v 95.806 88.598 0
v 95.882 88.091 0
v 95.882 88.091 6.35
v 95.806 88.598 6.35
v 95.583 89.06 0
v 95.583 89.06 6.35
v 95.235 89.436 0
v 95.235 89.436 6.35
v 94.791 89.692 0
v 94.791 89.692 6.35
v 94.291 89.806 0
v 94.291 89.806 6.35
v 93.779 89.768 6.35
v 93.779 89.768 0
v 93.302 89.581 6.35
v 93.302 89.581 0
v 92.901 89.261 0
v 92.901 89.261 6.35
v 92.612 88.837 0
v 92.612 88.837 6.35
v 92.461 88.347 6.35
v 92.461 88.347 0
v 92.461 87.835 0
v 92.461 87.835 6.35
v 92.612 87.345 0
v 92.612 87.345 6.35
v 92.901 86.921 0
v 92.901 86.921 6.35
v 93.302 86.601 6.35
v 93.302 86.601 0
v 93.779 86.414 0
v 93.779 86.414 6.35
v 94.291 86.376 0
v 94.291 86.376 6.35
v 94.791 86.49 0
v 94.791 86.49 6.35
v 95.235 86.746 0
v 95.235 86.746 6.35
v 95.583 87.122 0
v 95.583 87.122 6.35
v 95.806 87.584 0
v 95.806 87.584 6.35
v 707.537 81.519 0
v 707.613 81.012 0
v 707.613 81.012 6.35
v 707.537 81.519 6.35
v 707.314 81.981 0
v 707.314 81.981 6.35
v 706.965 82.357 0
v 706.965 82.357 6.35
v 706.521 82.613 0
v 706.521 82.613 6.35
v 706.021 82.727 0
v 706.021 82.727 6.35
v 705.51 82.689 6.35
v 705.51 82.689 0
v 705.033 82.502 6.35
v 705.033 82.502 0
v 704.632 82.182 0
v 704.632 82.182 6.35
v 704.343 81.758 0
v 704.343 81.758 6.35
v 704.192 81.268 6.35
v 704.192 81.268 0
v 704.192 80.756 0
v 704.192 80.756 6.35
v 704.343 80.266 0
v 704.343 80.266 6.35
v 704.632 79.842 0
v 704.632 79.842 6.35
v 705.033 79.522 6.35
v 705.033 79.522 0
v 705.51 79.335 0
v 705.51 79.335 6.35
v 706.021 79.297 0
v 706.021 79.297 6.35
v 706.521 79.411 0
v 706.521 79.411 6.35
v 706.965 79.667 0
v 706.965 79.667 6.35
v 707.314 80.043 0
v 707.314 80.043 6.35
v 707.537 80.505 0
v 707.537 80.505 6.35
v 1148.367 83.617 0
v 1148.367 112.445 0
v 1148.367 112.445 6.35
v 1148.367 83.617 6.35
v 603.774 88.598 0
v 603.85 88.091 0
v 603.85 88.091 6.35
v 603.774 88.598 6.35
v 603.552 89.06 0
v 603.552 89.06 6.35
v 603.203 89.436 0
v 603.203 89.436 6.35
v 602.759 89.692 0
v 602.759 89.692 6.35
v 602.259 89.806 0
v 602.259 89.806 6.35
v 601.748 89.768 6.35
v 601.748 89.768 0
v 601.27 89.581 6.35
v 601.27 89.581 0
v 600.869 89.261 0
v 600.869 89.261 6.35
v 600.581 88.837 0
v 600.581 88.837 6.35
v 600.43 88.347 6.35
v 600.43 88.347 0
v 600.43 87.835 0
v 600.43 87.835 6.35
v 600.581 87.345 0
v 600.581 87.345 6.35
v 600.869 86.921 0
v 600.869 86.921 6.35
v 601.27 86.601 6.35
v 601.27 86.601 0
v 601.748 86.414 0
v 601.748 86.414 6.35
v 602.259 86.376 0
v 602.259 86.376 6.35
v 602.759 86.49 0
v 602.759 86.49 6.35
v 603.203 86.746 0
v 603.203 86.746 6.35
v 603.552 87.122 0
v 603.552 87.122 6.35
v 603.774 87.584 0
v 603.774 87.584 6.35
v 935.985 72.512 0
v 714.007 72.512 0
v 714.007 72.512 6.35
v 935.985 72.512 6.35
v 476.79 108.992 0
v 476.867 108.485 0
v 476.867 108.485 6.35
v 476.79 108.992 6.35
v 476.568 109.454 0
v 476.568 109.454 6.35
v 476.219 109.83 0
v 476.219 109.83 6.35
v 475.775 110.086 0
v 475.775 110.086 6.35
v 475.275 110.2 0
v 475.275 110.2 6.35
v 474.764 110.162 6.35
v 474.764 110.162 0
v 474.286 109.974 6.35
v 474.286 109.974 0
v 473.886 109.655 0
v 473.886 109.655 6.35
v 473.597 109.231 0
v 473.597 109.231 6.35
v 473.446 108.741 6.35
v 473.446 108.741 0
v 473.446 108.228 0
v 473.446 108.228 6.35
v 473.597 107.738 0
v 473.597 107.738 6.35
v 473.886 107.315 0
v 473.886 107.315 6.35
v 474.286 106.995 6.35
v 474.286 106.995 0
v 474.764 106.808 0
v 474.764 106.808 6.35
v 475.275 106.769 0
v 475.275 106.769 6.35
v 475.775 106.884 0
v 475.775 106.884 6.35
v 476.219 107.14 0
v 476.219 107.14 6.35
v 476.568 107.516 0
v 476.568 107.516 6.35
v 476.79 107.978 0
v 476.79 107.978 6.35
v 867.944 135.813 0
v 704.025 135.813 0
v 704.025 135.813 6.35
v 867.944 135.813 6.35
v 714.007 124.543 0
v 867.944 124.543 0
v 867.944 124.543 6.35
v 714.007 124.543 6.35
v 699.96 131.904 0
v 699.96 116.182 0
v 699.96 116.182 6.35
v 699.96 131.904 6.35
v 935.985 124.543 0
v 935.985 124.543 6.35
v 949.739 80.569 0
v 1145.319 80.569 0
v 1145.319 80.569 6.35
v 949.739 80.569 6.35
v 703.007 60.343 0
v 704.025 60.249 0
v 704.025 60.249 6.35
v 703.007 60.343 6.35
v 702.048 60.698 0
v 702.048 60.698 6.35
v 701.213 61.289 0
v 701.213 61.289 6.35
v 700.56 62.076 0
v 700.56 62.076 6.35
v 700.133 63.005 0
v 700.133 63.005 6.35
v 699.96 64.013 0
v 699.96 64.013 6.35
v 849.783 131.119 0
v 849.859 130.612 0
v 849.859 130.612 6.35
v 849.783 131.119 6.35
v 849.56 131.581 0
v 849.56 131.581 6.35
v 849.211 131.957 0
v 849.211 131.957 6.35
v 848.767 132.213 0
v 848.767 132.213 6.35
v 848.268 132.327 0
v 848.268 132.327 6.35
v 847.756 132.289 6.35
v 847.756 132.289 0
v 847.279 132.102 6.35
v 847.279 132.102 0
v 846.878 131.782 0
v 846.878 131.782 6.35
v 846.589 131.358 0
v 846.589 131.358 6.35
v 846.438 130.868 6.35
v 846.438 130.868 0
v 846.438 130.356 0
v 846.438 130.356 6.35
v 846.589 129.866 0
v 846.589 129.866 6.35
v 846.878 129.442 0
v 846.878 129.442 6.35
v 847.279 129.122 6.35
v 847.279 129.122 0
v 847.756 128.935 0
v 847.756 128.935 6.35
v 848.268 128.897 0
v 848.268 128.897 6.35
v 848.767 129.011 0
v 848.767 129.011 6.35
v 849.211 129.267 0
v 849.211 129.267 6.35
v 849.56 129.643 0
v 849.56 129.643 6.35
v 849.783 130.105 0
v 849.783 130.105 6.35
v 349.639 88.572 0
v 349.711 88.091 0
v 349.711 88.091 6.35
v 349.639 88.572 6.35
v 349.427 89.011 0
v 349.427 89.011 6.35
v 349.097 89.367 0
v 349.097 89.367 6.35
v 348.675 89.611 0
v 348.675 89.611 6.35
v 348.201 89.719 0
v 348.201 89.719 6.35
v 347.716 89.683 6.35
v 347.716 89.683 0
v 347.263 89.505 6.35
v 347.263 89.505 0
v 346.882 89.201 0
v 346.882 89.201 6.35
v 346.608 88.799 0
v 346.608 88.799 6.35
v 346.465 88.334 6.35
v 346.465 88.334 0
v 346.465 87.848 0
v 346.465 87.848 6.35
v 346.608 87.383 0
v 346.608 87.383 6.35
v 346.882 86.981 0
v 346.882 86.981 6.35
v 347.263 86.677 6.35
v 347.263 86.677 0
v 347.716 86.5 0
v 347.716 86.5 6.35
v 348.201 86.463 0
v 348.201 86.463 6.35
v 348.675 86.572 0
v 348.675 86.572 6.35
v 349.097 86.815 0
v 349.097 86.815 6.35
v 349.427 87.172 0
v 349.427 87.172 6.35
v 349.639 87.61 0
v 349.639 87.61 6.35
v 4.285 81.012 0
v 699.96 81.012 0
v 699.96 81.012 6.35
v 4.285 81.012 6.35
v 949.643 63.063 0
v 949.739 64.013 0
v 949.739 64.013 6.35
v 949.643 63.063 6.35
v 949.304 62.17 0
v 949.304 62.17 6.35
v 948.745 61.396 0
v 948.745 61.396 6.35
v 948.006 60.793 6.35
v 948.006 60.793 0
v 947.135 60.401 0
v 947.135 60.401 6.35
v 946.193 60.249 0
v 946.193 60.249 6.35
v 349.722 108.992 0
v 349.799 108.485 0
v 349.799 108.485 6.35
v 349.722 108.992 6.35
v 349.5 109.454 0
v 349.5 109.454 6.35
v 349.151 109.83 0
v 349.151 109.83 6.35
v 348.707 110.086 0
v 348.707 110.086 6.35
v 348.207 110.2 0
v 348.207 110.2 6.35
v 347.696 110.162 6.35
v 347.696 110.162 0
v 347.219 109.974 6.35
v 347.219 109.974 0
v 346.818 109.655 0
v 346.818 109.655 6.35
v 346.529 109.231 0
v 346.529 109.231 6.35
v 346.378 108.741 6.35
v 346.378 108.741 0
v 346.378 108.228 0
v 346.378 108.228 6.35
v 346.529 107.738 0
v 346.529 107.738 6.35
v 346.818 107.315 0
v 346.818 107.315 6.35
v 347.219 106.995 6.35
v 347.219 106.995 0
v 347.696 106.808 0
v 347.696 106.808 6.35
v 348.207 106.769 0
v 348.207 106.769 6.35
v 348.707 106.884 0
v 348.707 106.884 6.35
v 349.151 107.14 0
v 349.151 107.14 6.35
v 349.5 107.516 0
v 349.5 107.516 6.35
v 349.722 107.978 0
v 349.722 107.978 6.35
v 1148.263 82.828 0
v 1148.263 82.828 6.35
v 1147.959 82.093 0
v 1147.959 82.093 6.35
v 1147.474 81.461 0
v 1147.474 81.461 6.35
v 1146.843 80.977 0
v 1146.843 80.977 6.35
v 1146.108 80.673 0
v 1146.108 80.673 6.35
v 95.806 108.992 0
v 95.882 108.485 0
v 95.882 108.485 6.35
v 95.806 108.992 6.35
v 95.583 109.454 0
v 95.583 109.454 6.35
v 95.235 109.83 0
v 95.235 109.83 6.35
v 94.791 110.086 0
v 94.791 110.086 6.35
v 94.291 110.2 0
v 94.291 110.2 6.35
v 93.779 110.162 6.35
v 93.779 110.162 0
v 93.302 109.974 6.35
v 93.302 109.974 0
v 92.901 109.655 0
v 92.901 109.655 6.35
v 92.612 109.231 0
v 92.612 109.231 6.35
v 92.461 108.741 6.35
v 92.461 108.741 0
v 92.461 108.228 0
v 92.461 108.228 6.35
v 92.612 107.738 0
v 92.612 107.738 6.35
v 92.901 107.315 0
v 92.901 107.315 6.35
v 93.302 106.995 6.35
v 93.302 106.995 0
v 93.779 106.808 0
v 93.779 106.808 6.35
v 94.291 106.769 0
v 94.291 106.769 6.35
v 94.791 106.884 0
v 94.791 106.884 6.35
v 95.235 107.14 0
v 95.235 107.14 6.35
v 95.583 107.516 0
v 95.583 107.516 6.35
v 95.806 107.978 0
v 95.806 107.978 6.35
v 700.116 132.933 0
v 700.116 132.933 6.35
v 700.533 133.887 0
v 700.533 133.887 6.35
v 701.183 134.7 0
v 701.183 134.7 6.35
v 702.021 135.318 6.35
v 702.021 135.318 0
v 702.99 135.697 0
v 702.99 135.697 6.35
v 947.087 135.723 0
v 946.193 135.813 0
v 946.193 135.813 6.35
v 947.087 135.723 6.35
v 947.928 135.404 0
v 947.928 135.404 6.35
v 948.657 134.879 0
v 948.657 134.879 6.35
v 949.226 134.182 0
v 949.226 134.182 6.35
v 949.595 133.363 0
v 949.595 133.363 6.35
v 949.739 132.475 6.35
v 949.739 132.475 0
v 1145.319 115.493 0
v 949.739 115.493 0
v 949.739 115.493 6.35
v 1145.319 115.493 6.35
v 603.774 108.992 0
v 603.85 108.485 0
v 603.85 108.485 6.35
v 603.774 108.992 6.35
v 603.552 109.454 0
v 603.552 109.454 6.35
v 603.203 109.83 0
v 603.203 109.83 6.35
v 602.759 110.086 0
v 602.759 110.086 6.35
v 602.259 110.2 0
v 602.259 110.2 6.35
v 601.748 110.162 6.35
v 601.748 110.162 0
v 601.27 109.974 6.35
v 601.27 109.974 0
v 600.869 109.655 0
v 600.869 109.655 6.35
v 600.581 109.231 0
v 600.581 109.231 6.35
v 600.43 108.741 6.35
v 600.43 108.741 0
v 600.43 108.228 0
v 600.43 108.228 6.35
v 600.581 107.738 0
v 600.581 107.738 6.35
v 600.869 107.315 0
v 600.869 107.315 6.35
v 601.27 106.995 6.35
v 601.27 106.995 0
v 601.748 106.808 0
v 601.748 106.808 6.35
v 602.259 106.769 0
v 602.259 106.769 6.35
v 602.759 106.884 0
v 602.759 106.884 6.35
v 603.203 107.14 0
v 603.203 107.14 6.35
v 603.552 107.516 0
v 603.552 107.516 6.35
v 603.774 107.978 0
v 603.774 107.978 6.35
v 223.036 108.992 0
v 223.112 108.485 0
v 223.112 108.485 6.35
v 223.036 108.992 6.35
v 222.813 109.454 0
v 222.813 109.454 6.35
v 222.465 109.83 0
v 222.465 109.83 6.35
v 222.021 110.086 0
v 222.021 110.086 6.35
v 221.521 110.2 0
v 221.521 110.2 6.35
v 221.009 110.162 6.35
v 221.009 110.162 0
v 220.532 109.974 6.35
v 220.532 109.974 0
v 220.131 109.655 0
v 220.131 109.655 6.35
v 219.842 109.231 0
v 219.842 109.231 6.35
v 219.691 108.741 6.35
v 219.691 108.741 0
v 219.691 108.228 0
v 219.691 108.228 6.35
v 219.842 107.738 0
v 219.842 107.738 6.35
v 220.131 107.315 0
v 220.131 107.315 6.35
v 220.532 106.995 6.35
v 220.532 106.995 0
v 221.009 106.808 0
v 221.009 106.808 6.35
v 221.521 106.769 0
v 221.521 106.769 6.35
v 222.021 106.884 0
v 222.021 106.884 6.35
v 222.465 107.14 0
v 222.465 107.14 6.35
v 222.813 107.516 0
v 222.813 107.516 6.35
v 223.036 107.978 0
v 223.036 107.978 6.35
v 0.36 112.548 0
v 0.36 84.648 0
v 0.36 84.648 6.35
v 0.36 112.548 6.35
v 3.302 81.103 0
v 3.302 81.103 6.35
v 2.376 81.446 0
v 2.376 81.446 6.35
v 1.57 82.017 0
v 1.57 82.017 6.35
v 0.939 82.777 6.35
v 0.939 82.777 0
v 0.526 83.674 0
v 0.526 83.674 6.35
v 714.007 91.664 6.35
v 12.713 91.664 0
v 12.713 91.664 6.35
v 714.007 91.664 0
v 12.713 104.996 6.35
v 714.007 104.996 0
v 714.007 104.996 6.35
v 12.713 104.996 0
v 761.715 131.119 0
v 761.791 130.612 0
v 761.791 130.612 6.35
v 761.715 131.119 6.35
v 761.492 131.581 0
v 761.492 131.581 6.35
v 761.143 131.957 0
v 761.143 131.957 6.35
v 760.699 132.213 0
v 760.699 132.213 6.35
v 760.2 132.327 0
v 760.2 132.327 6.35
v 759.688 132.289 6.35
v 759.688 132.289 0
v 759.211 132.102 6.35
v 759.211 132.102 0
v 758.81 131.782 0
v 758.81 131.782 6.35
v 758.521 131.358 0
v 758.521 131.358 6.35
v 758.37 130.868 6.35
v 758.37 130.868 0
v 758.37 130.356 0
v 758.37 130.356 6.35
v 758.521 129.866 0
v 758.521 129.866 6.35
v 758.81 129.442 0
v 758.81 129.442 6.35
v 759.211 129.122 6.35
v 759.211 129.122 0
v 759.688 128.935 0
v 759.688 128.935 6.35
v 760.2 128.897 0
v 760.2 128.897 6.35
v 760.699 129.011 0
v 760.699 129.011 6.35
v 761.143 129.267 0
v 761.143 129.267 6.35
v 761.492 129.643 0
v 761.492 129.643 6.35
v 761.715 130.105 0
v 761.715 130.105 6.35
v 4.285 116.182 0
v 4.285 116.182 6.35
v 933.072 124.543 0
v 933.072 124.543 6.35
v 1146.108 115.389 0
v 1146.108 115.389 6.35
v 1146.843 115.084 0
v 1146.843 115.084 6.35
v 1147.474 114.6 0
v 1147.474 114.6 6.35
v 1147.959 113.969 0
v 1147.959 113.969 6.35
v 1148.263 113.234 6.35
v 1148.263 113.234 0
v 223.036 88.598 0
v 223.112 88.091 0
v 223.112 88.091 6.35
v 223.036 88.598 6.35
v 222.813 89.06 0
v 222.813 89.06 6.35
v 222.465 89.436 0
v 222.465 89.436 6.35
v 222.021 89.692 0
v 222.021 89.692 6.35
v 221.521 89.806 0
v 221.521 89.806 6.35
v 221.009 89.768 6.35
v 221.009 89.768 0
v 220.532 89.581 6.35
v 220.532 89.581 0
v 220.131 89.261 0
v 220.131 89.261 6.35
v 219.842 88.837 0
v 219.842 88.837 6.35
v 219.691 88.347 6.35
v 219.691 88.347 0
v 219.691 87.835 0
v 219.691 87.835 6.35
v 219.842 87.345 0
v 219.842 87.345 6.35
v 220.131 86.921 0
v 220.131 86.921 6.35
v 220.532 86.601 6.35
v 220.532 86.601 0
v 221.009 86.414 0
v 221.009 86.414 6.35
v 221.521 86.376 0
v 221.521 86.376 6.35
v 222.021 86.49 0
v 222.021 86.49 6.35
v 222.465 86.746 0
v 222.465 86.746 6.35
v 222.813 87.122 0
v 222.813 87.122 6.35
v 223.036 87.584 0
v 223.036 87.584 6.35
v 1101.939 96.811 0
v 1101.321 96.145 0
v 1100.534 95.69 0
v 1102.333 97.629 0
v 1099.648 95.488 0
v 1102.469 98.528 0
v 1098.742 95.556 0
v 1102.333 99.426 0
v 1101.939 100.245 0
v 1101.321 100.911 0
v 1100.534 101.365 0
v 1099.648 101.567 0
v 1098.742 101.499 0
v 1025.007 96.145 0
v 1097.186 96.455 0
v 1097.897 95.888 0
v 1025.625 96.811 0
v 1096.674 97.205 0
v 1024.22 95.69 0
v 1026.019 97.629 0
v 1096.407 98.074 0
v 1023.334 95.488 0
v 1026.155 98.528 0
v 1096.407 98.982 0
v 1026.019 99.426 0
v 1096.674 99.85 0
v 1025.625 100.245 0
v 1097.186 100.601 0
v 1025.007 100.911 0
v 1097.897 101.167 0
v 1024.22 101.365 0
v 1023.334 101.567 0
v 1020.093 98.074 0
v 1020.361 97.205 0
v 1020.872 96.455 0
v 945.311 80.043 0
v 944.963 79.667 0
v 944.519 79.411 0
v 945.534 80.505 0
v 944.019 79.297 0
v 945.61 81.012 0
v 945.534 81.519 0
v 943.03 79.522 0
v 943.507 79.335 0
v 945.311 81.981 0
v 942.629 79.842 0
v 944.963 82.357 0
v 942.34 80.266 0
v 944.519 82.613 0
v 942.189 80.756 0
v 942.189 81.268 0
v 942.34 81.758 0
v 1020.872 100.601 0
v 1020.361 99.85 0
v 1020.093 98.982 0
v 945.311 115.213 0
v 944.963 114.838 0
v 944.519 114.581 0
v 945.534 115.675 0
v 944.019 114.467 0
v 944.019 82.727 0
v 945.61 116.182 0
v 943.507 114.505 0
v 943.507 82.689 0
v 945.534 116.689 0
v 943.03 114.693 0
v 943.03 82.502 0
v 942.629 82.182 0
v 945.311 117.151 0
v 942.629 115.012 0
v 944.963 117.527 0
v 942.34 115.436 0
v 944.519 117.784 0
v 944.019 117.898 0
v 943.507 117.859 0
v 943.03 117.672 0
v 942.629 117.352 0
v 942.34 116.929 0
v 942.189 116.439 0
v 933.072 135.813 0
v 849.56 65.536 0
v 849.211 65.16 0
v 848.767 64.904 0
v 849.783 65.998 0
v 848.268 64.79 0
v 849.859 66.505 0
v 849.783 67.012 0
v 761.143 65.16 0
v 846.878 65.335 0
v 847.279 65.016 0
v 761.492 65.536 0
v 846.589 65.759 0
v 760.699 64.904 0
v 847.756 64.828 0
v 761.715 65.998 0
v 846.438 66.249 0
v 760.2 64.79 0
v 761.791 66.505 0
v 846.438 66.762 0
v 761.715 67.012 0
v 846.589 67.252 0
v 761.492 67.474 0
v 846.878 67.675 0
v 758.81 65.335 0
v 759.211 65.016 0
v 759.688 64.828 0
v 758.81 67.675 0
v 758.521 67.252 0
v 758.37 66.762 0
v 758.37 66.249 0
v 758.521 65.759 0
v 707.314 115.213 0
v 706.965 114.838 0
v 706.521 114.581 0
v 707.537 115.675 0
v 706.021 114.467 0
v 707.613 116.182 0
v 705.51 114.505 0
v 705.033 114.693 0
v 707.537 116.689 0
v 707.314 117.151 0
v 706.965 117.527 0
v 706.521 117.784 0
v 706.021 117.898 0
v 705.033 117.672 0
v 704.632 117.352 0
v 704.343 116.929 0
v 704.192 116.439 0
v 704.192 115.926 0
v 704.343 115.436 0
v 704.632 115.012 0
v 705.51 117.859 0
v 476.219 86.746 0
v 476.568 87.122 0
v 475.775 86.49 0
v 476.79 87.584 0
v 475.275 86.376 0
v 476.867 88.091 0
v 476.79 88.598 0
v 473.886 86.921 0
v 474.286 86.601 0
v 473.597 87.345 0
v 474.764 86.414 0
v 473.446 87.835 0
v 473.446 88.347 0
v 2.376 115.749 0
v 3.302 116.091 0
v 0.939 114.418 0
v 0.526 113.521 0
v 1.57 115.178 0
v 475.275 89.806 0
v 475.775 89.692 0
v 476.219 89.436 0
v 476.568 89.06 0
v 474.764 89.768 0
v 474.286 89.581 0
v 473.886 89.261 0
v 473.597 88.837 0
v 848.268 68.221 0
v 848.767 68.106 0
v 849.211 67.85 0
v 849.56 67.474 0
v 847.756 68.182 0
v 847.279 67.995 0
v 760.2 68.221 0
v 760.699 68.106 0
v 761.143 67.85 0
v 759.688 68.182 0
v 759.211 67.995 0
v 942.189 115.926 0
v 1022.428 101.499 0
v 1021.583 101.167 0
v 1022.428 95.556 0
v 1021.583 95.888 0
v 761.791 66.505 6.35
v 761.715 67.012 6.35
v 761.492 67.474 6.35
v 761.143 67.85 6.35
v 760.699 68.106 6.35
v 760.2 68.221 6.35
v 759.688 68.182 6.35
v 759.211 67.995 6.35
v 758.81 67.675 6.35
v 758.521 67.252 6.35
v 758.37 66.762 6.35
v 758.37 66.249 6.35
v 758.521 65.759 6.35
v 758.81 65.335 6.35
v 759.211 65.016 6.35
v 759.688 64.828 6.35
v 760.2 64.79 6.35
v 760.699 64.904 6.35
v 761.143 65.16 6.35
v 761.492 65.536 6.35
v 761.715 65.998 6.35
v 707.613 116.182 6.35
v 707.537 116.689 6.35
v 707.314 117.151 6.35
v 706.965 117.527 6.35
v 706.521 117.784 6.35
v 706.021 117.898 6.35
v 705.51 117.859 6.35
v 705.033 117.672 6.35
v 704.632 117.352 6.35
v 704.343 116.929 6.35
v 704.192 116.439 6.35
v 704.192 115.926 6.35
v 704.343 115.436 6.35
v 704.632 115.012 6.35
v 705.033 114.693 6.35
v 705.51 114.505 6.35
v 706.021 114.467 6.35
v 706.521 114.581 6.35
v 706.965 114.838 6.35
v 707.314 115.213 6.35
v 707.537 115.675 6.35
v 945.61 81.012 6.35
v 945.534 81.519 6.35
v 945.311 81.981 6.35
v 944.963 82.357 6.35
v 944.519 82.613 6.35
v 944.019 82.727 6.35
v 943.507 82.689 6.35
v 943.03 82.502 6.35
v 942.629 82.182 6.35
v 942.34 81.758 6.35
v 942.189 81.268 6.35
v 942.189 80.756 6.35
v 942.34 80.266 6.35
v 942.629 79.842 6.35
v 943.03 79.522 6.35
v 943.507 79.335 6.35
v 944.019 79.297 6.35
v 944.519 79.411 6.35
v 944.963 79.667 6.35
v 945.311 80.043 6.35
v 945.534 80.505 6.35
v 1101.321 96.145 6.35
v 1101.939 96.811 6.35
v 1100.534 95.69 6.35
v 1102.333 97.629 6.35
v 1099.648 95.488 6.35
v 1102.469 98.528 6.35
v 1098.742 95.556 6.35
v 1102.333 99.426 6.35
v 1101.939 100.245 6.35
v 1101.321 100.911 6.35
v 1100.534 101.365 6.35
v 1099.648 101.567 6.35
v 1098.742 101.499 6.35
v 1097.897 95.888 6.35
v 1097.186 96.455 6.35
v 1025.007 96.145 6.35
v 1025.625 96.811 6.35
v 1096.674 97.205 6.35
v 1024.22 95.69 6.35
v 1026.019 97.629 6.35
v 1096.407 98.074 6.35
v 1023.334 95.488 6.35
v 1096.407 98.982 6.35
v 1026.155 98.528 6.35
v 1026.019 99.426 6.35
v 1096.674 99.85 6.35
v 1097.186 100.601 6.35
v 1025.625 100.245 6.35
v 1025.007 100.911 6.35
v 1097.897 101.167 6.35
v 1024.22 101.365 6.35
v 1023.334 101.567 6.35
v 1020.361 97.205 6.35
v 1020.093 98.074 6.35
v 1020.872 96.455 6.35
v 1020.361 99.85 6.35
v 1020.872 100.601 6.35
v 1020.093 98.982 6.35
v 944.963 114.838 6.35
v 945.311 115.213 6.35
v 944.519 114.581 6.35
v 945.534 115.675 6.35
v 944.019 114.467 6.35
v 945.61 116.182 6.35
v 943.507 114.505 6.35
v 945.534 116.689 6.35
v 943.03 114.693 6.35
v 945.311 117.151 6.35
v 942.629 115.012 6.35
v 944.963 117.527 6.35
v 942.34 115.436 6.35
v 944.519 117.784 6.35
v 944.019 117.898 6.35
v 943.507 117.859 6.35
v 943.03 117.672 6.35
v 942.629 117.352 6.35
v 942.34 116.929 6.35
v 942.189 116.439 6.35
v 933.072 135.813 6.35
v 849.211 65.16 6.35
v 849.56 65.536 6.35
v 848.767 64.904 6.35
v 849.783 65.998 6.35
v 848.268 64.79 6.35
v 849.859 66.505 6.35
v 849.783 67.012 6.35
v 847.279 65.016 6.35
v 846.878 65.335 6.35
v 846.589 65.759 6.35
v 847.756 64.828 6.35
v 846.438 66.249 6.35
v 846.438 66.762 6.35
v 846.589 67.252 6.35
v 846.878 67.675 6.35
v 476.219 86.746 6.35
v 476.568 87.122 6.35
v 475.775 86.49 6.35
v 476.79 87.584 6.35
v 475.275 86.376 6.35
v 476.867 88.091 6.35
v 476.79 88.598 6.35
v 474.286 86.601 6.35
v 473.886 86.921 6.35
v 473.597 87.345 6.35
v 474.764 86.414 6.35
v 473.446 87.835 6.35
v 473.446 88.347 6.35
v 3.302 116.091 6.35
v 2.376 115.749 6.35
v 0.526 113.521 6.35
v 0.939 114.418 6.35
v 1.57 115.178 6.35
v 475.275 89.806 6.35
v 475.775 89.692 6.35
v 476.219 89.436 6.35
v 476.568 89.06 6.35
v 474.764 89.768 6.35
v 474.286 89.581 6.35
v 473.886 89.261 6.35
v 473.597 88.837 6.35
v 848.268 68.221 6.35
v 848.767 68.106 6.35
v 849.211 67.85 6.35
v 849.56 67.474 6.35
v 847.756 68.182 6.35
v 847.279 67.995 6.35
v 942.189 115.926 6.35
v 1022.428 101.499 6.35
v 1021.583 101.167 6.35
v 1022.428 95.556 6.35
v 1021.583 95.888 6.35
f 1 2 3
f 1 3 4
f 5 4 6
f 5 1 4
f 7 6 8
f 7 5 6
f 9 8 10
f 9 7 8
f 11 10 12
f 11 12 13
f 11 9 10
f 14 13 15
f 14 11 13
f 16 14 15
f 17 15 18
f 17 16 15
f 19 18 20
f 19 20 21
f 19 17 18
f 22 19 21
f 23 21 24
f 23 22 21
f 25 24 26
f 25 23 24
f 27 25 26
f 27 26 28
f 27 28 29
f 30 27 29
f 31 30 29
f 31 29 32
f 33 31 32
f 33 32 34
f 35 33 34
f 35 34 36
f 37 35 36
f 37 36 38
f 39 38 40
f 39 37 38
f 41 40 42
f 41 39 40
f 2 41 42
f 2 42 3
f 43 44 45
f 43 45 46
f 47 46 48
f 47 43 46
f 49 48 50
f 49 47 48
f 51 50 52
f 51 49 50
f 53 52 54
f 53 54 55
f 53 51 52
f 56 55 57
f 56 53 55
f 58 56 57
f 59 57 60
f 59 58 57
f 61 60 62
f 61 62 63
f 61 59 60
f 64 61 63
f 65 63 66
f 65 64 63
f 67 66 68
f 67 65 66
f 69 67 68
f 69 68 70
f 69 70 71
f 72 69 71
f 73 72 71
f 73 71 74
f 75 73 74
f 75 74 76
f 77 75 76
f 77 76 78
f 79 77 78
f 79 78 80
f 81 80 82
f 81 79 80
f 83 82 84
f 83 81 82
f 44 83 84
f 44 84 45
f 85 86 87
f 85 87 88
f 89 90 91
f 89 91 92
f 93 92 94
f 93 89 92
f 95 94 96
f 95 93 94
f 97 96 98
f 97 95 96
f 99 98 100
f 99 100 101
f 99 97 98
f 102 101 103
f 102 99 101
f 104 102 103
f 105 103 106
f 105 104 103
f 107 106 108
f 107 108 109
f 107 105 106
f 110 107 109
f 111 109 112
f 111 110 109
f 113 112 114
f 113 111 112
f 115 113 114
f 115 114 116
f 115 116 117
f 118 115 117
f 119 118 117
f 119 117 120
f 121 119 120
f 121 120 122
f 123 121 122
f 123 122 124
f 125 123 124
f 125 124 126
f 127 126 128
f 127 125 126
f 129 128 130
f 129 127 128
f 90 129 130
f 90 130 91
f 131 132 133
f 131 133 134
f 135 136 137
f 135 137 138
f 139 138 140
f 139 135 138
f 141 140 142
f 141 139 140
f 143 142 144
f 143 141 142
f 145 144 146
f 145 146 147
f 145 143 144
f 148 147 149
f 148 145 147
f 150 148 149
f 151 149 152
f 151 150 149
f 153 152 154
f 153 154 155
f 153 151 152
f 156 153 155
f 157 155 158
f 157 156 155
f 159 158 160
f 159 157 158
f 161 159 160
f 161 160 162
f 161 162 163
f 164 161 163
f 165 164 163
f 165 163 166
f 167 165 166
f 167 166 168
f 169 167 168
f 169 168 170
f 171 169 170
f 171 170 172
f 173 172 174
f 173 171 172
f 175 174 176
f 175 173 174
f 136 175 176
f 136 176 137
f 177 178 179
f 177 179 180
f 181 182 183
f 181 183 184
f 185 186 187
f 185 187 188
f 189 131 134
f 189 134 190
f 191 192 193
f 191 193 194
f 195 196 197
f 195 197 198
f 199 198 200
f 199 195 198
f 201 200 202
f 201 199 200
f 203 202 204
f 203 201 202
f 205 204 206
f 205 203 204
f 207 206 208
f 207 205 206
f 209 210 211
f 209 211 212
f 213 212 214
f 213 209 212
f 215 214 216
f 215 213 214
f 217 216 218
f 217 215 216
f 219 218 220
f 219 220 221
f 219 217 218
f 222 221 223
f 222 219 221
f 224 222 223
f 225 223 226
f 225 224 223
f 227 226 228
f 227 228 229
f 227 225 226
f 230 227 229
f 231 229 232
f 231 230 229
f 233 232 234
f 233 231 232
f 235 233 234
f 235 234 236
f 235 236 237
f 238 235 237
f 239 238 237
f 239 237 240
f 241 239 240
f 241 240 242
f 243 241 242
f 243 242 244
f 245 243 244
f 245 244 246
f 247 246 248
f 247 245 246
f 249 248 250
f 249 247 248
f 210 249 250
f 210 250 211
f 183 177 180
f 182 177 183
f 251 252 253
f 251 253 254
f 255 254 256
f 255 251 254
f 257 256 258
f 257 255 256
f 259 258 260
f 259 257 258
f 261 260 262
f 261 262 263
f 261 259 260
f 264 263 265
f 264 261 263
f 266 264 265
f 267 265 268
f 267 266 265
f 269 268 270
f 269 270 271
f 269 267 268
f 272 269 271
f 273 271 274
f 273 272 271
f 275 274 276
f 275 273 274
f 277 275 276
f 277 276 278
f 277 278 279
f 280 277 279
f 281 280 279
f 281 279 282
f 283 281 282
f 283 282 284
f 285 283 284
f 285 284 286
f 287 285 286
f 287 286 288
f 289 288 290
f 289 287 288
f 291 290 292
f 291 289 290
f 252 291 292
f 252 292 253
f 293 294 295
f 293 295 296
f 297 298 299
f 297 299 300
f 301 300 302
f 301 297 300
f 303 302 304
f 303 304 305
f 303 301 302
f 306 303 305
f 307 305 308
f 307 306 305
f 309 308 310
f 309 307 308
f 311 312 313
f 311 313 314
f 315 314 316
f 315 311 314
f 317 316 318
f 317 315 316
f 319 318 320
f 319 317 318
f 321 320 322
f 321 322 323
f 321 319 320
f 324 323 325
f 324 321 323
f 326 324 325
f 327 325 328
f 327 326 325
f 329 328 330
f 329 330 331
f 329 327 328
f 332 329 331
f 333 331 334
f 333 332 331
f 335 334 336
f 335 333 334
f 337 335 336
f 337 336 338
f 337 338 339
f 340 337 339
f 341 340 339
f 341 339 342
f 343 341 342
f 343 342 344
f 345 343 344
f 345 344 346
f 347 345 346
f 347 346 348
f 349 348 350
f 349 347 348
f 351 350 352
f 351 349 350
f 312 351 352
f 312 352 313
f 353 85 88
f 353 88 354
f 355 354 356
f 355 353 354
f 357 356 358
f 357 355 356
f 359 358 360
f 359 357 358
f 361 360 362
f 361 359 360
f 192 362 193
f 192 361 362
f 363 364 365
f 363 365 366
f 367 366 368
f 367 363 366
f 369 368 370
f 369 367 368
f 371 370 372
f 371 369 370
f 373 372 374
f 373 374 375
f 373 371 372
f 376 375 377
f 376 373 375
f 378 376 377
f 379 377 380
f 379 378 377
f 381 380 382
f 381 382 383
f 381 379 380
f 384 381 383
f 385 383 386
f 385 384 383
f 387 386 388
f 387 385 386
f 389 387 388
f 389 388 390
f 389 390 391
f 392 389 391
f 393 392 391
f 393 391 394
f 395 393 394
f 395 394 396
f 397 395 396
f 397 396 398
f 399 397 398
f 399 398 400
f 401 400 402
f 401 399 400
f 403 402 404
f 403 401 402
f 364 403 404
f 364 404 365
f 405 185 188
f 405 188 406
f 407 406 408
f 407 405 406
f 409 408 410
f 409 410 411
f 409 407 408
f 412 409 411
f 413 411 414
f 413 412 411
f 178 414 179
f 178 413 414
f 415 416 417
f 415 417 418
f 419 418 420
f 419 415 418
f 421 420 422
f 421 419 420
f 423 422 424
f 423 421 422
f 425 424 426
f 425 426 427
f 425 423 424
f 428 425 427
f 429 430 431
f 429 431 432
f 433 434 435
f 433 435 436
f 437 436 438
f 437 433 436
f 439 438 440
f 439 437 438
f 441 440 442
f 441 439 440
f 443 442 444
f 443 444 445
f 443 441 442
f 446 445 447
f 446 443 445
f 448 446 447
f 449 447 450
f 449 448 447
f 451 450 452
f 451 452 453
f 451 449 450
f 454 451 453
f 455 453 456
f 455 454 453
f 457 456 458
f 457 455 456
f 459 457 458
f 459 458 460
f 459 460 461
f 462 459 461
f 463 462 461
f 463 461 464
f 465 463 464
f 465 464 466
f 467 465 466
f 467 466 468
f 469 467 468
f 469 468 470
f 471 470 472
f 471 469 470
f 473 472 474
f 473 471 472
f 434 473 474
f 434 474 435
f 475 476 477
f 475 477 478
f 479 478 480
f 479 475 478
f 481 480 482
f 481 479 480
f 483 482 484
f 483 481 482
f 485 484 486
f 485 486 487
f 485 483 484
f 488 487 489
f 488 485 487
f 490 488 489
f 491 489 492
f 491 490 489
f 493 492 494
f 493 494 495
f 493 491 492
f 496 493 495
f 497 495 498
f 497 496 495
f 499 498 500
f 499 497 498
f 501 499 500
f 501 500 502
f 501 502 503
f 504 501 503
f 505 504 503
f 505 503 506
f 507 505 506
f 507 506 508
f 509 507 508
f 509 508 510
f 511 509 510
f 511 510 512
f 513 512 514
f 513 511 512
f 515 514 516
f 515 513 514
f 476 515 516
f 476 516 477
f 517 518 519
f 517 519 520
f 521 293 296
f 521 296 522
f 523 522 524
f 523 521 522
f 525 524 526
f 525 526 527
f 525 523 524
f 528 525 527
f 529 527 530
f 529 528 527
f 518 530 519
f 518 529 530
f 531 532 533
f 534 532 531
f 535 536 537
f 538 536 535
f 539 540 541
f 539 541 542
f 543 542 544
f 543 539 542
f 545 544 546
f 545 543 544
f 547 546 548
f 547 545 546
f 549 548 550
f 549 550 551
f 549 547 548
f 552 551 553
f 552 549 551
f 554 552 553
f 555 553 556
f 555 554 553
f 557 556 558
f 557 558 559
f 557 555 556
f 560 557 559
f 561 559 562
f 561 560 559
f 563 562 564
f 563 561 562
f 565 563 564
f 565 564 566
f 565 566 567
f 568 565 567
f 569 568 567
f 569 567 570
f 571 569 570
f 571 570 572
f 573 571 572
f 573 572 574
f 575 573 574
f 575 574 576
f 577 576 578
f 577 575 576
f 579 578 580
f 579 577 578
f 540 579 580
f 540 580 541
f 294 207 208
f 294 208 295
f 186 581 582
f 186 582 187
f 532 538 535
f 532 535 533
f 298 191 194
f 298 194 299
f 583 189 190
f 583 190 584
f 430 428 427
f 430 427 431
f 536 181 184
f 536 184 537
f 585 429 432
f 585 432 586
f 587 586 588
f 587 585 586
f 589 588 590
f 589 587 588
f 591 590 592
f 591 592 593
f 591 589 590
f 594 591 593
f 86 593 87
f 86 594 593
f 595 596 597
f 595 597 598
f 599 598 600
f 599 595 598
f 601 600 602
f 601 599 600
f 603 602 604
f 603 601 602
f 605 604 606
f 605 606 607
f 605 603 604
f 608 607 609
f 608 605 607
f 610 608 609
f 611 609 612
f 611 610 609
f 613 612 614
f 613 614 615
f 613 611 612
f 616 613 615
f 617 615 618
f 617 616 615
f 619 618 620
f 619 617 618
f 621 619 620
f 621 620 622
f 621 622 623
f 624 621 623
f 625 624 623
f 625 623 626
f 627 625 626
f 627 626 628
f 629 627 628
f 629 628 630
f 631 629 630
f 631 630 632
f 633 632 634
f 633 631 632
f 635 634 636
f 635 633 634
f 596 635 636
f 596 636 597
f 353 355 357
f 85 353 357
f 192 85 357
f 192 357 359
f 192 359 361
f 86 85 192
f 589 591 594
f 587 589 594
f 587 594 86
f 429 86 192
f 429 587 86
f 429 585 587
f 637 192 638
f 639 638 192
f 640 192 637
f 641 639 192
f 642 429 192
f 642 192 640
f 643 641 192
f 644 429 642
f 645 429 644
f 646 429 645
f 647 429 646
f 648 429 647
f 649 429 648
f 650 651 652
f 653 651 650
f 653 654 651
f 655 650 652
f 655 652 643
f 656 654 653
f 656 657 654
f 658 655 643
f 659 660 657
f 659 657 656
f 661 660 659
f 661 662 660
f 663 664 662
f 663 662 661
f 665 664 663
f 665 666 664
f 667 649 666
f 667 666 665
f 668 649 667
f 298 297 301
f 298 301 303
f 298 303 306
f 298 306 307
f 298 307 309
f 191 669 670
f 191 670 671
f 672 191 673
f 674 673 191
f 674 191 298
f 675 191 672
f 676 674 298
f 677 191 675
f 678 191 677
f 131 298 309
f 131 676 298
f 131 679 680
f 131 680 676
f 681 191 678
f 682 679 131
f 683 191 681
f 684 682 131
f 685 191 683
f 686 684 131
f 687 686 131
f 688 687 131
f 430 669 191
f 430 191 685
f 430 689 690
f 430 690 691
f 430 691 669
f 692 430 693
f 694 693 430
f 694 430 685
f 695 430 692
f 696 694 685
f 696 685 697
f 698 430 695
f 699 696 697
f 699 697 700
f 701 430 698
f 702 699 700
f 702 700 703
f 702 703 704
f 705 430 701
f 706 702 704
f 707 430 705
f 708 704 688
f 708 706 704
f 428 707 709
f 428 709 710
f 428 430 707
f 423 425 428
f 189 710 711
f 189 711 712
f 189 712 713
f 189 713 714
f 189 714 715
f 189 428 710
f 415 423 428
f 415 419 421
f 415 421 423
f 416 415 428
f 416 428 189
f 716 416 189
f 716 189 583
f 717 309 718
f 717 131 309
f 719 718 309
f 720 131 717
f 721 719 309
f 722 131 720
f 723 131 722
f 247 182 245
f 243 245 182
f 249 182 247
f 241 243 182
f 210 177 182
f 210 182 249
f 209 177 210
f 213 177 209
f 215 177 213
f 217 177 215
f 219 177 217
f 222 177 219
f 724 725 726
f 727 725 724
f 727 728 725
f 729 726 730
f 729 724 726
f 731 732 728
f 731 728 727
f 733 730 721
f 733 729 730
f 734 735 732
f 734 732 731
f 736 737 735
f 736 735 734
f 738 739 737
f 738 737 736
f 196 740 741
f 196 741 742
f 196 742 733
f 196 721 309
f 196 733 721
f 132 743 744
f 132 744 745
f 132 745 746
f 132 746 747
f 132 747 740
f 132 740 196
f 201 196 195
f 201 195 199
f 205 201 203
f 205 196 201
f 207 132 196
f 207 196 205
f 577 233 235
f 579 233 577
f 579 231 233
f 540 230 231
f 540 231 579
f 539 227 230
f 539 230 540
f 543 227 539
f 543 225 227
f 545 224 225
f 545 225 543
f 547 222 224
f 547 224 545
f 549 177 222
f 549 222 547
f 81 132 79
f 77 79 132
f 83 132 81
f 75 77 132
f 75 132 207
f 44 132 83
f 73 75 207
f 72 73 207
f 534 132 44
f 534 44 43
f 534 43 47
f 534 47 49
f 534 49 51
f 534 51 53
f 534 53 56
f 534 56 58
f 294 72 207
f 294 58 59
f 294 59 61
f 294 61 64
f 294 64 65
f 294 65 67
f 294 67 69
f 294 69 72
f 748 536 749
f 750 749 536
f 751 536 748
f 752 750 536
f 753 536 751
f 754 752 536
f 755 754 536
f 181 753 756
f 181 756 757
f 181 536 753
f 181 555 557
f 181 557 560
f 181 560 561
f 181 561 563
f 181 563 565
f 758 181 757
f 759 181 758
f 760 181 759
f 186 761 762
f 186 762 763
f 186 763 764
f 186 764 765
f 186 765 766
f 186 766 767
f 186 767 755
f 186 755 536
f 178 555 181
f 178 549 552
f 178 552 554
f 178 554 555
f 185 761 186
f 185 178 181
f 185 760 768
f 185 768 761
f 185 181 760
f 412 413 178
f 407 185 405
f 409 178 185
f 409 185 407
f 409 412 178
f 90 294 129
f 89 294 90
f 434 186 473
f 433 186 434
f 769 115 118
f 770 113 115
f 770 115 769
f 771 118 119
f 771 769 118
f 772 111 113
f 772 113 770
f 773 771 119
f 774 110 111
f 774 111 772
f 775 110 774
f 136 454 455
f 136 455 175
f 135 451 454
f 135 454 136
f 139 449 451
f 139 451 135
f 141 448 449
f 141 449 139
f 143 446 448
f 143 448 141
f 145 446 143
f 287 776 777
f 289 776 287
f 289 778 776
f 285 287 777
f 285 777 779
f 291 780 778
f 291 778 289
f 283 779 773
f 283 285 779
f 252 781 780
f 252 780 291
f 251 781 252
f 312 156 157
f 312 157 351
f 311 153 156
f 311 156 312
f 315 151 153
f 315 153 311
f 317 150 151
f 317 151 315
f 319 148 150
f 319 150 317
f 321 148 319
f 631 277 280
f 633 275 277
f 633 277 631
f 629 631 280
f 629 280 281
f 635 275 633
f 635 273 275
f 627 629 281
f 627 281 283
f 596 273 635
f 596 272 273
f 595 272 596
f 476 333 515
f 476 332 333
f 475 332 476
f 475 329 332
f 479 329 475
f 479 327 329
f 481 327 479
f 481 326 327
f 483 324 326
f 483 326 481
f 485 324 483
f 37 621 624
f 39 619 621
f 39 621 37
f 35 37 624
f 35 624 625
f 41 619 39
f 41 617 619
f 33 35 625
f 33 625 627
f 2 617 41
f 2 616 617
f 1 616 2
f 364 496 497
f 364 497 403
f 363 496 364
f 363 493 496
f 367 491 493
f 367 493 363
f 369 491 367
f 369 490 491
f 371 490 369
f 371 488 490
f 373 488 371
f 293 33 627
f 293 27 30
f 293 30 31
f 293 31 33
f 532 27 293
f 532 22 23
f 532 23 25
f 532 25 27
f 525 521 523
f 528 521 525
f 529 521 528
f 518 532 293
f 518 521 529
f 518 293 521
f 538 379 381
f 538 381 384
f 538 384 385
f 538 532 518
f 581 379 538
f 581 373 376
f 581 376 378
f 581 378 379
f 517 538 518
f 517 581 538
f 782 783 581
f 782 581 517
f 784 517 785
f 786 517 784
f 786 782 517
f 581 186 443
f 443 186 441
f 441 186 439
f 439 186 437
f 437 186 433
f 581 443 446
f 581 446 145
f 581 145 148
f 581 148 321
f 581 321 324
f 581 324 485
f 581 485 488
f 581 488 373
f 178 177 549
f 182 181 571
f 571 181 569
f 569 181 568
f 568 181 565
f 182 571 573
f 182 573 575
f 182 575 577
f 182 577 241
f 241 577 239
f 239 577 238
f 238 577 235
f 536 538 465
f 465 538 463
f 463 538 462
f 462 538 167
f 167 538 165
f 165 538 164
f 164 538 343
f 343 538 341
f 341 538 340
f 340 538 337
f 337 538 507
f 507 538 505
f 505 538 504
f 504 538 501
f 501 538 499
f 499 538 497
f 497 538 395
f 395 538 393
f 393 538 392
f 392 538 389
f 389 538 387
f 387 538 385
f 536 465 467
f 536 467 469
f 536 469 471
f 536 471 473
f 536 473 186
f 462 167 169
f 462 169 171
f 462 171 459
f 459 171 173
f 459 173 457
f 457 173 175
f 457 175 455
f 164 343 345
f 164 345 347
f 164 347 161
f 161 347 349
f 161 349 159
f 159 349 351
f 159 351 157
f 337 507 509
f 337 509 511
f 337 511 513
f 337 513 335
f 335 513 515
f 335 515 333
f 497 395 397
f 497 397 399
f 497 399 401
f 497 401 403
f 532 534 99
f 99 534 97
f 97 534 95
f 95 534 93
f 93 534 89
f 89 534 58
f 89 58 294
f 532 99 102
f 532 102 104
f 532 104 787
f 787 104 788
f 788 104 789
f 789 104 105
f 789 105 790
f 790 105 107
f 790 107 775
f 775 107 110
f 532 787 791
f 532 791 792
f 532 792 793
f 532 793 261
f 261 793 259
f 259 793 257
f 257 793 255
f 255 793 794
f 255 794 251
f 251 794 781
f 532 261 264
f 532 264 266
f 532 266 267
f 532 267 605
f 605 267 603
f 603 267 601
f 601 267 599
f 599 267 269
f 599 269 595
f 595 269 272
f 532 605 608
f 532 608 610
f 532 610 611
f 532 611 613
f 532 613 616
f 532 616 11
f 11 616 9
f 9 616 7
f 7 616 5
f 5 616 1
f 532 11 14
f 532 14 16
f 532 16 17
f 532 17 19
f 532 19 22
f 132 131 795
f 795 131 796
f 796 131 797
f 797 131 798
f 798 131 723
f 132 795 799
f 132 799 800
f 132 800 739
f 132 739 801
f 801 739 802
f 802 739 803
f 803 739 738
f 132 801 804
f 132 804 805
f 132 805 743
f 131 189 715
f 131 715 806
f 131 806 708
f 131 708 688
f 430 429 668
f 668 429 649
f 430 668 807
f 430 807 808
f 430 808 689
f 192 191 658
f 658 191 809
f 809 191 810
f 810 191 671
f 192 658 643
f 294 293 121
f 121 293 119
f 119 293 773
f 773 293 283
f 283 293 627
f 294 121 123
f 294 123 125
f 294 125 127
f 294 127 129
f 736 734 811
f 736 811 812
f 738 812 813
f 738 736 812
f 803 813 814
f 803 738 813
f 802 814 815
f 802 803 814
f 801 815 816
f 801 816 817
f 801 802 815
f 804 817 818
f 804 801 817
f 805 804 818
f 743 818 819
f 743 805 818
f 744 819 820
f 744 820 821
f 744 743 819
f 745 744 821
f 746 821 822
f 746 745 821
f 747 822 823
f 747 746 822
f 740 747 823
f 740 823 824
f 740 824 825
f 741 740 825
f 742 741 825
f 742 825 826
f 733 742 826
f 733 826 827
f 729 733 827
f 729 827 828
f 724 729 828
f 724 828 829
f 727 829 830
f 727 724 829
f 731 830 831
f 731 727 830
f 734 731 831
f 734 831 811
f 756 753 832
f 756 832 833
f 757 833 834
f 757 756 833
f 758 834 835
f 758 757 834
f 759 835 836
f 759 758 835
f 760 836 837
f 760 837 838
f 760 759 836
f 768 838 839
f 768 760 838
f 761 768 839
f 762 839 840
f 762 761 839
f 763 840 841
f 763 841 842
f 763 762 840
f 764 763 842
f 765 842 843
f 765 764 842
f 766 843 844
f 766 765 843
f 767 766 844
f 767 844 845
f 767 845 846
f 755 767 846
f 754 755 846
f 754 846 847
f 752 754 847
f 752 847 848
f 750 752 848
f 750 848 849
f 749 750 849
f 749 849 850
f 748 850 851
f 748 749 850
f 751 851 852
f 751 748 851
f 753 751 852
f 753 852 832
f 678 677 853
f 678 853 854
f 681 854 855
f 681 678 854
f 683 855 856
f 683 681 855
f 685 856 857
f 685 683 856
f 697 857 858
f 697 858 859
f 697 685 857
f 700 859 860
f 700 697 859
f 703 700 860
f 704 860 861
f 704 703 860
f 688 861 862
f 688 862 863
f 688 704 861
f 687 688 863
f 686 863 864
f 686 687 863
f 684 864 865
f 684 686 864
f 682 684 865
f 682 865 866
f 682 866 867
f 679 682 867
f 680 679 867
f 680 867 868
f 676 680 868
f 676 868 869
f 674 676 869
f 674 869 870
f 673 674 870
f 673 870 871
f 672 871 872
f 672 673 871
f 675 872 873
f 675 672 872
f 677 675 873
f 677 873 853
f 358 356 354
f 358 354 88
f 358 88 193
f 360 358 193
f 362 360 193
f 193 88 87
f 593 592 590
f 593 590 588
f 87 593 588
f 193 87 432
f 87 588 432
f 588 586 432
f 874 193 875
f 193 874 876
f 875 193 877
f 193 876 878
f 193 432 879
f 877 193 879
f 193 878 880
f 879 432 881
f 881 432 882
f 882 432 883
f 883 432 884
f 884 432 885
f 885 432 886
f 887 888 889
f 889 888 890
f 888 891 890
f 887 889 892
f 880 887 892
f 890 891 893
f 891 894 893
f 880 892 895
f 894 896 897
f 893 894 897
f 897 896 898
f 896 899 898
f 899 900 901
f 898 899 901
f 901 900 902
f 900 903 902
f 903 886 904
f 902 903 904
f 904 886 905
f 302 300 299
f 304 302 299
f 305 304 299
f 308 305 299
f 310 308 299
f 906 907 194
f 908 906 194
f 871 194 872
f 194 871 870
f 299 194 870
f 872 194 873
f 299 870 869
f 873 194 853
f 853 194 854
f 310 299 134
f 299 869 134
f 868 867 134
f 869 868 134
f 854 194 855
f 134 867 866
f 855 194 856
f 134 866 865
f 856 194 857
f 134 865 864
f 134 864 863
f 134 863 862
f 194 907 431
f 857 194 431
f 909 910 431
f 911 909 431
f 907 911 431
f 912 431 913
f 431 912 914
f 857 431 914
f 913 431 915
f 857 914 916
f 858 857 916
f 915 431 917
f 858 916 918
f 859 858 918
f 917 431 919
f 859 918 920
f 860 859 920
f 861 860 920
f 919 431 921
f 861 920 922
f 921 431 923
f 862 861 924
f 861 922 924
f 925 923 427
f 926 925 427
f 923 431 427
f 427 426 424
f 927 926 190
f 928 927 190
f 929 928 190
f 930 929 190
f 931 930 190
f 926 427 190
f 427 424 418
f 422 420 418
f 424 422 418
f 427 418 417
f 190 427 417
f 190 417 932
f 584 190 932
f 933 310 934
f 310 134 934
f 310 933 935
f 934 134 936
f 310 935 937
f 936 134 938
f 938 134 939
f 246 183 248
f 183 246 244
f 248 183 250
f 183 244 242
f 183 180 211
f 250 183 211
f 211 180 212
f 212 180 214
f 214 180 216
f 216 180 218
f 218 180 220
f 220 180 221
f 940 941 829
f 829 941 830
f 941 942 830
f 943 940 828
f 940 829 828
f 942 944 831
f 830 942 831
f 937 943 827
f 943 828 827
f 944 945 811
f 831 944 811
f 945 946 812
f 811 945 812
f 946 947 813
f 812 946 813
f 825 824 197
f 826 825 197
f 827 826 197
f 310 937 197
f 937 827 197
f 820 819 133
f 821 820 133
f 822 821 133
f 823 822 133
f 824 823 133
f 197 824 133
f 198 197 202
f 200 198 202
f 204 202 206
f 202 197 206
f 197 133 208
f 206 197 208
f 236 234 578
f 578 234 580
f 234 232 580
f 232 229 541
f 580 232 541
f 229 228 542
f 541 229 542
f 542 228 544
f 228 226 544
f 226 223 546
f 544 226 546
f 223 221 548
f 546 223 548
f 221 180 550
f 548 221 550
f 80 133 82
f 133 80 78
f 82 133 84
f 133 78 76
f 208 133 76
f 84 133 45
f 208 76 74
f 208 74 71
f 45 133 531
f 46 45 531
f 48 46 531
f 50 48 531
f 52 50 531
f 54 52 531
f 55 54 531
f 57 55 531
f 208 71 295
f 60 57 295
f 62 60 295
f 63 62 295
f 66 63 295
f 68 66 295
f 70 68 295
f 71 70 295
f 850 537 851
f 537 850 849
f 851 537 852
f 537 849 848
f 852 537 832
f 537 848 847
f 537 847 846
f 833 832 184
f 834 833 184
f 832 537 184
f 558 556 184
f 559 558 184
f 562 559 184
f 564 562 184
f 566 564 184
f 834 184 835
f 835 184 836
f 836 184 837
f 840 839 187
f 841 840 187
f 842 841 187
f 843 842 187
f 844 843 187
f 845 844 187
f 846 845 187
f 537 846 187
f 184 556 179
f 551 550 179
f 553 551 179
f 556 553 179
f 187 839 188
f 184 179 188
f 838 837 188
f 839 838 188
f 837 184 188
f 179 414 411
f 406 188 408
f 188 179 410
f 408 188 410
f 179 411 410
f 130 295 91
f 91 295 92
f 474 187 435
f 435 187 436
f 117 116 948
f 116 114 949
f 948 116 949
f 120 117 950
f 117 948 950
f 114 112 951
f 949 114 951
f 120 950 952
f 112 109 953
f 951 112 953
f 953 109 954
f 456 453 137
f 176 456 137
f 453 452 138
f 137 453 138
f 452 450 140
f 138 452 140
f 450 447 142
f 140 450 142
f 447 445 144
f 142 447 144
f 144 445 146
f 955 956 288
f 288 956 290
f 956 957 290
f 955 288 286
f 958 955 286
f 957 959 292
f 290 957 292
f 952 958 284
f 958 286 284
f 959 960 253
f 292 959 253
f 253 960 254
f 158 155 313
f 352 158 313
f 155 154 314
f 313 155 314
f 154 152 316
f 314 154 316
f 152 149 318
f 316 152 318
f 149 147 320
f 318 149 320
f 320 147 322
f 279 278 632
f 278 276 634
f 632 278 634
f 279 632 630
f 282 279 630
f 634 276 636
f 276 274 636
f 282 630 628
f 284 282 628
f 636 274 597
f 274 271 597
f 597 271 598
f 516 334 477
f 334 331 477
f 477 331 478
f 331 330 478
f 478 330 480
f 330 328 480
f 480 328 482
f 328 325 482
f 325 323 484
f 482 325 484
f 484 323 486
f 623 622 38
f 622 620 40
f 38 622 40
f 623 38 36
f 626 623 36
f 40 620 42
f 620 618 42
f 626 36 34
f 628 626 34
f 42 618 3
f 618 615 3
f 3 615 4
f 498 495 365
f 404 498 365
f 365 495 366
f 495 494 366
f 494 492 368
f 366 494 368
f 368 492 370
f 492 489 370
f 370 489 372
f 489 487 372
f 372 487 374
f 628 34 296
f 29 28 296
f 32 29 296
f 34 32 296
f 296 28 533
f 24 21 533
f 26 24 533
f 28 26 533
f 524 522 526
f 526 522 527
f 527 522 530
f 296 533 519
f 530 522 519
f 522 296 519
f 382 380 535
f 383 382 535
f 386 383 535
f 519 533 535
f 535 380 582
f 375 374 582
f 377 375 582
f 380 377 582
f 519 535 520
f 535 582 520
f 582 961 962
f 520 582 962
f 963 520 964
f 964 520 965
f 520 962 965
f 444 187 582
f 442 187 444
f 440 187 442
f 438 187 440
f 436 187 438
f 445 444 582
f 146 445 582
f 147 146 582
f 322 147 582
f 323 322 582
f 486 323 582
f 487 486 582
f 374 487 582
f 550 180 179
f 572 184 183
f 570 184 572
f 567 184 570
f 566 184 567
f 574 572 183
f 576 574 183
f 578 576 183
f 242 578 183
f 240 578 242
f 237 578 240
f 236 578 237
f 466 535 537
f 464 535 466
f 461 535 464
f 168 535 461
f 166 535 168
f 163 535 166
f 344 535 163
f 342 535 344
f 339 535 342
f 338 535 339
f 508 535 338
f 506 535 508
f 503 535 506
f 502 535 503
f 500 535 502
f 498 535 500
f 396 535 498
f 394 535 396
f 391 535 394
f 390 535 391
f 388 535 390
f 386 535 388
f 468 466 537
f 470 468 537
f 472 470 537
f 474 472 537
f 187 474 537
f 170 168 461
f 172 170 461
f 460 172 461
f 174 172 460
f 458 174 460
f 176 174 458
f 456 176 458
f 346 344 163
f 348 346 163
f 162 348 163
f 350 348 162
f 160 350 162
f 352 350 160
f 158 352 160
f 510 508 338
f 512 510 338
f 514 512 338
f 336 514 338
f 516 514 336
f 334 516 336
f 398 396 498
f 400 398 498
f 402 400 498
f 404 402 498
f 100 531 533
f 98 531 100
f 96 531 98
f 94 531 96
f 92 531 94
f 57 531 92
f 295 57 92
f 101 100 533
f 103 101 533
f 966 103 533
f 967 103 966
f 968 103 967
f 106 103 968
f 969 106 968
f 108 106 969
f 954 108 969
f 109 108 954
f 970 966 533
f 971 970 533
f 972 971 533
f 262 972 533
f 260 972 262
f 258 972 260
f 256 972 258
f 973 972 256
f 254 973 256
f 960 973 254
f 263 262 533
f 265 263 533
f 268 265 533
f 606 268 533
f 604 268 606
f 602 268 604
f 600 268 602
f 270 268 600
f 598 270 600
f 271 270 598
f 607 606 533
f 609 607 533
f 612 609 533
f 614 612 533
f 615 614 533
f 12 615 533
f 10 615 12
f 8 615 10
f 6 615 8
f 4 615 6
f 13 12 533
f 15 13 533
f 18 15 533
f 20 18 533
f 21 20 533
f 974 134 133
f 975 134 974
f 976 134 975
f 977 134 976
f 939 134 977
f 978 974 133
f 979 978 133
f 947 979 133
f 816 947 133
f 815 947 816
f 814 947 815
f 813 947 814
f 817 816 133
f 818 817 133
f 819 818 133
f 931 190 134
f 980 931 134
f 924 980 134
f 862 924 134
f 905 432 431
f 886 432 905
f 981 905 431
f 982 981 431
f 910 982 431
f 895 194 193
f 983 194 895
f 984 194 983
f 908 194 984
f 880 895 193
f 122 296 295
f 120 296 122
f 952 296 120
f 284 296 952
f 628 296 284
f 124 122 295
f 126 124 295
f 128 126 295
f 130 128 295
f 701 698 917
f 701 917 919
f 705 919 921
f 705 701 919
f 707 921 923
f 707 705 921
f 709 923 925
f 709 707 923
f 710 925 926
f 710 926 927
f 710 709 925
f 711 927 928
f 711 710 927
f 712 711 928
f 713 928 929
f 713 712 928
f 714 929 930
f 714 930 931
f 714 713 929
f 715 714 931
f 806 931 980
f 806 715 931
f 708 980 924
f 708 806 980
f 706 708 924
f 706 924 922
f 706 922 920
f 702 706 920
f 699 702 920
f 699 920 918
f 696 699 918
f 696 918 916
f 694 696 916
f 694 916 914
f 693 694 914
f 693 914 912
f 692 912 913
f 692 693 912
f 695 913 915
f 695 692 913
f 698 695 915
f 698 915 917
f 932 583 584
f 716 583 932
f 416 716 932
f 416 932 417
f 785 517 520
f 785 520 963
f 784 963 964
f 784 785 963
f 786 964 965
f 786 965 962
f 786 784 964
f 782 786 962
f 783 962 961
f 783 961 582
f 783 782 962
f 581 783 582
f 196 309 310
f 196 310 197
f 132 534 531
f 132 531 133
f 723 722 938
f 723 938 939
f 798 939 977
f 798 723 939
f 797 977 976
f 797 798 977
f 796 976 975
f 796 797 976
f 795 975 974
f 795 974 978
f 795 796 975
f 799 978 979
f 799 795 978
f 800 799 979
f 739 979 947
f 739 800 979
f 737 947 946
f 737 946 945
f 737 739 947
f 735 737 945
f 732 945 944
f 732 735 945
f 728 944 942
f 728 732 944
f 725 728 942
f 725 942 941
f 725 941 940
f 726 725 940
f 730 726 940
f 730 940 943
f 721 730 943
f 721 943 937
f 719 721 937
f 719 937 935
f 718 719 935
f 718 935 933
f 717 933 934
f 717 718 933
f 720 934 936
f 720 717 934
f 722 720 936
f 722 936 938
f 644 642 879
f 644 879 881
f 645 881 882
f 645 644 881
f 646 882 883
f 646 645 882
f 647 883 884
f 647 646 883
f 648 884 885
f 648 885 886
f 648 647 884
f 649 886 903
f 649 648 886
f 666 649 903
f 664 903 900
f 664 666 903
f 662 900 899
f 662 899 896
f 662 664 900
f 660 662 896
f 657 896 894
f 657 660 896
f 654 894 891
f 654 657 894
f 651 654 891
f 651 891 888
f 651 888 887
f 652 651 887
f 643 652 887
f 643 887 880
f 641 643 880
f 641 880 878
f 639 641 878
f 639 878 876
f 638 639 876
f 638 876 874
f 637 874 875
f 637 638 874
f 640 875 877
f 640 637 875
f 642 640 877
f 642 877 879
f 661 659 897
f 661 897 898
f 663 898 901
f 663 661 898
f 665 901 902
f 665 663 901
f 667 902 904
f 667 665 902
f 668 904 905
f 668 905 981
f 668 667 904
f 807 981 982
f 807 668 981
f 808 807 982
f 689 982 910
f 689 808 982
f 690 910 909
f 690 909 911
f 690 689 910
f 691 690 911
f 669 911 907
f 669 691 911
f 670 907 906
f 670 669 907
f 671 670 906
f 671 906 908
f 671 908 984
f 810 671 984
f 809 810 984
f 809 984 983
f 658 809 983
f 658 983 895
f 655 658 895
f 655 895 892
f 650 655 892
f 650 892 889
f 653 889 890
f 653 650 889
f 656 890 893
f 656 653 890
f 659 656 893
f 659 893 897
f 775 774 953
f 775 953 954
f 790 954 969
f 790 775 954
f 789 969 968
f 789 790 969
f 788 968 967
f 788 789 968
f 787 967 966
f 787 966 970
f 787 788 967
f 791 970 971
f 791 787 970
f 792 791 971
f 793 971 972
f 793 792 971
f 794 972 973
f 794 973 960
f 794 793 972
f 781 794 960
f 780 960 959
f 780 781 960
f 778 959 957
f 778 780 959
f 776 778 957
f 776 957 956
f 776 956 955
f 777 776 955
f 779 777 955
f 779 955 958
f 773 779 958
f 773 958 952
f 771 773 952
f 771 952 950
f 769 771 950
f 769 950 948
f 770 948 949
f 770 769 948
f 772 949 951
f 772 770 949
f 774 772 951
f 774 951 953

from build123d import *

# Parameters (mm, degrees)
SKETCH1_R           = 1.720095417
SKETCH1_R_2         = 1.632335783
SKETCH1_R_3         = 3.048
BOSS_EXTRUDE1_DEPTH = 6.35


with BuildPart() as part:
    # Sketch1 → Boss-Extrude1 (new body)
    with BuildSketch(Plane.XY):
        with BuildLine():
            Line((0.359622665, 112.547896558), (0.359622665, 84.647626996))
            ThreePointArc((0.359622665, 84.647626996), (1.569547298, 82.016705042), (4.285435965, 81.011908201))
            Line((4.285435965, 81.011908201), (699.960441306, 81.011908201))
            Line((699.960441306, 81.011908201), (699.960441306, 64.012598058))
            ThreePointArc((699.960441306, 64.012598058), (701.213068629, 61.288906282), (704.024750828, 60.24870663))
            Line((704.024750828, 60.24870663), (943.890172073, 60.24870663))
            Line((943.890172073, 60.24870663), (946.192785632, 60.24870663))
            ThreePointArc((946.192785632, 60.24870663), (948.74540471, 61.39621374), (949.738968911, 64.012598058))
            Line((949.738968911, 64.012598058), (949.738968911, 80.56870663))
            Line((949.738968911, 80.56870663), (1145.318968911, 80.56870663))
            ThreePointArc((1145.318968911, 80.56870663), (1147.47423038, 81.461445161), (1148.366968911, 83.61670663))
            Line((1148.366968911, 83.61670663), (1148.366968911, 112.444795653))
            ThreePointArc((1148.366968911, 112.444795653), (1147.47423038, 114.600057122), (1145.318968911, 115.492795653))
            Line((1145.318968911, 115.492795653), (949.738968911, 115.492795653))
            Line((949.738968911, 115.492795653), (949.738968911, 132.475411377))
            ThreePointArc((949.738968911, 132.475411377), (948.657072186, 134.878542119), (946.192785632, 135.812795653))
            Line((946.192785632, 135.812795653), (943.890172073, 135.812795653))
            Line((943.890172073, 135.812795653), (933.071984653, 135.812795653))
            Line((933.071984653, 135.812795653), (933.071984653, 124.543323228))
            Line((933.071984653, 124.543323228), (935.984655082, 124.543323228))
            Line((935.984655082, 124.543323228), (935.984655082, 72.51225313))
            Line((935.984655082, 72.51225313), (714.00720644, 72.51225313))
            Line((714.00720644, 72.51225313), (714.00720644, 91.663924817))
            Line((714.00720644, 91.663924817), (12.71320644, 91.663924817))
            Line((12.71320644, 91.663924817), (12.71320644, 104.995667719))
            Line((12.71320644, 104.995667719), (714.00720644, 104.995667719))
            Line((714.00720644, 104.995667719), (714.00720644, 124.543323228))
            Line((714.00720644, 124.543323228), (867.944172073, 124.543323228))
            Line((867.944172073, 124.543323228), (867.944172073, 130.611938178))
            Line((867.944172073, 130.611938178), (867.944172073, 135.812795653))
            Line((867.944172073, 135.812795653), (704.024750828, 135.812795653))
            ThreePointArc((704.024750828, 135.812795653), (701.183091811, 134.700225562), (699.960441306, 131.904163347))
            Line((699.960441306, 131.904163347), (699.960441306, 116.18243367))
            Line((699.960441306, 116.18243367), (4.285435965, 116.18243367))
            ThreePointArc((4.285435965, 116.18243367), (1.569792033, 115.17822767), (0.359622665, 112.547896558))
        make_face()
        with Locations((94.1622142, 88.091107164)):
            Circle(SKETCH1_R, mode=Mode.SUBTRACT)
        with Locations((221.392126764, 88.091107164)):
            Circle(SKETCH1_R, mode=Mode.SUBTRACT)
        with Locations((348.078760153, 88.091107164)):
            Circle(SKETCH1_R_2, mode=Mode.SUBTRACT)
        with Locations((475.146430575, 88.091107164)):
            Circle(SKETCH1_R, mode=Mode.SUBTRACT)
        with Locations((760.070975046, 66.505299661)):
            Circle(SKETCH1_R, mode=Mode.SUBTRACT)
        with Locations((848.138968911, 66.505299661)):
            Circle(SKETCH1_R, mode=Mode.SUBTRACT)
        with Locations((705.892847696, 81.011908201)):
            Circle(SKETCH1_R, mode=Mode.SUBTRACT)
        with Locations((602.130384222, 88.091107164)):
            Circle(SKETCH1_R, mode=Mode.SUBTRACT)
        with BuildLine():
            ThreePointArc((945.610267489, 81.011908201), (945.106463206, 79.795617068), (943.890172073, 79.291812784))
            ThreePointArc((943.890172073, 79.291812784), (942.673880939, 82.228199334), (945.610267489, 81.011908201))
        make_face(mode=Mode.SUBTRACT)
        with Locations((94.1622142, 108.484732819)):
            Circle(SKETCH1_R, mode=Mode.SUBTRACT)
        with Locations((221.392126764, 108.484732819)):
            Circle(SKETCH1_R, mode=Mode.SUBTRACT)
        with Locations((348.078760153, 108.484732819)):
            Circle(SKETCH1_R, mode=Mode.SUBTRACT)
        with Locations((475.146430575, 108.484732819)):
            Circle(SKETCH1_R, mode=Mode.SUBTRACT)
        with Locations((602.130384222, 108.484732819)):
            Circle(SKETCH1_R, mode=Mode.SUBTRACT)
        with Locations((705.892847696, 116.18243367)):
            Circle(SKETCH1_R, mode=Mode.SUBTRACT)
        with Locations((1023.106655082, 98.527788179)):
            Circle(SKETCH1_R_3, mode=Mode.SUBTRACT)
        with Locations((1099.420523291, 98.527788179)):
            Circle(SKETCH1_R_3, mode=Mode.SUBTRACT)
        with BuildLine():
            ThreePointArc((945.610267489, 116.18243367), (942.673880939, 114.966142537), (943.890172073, 117.902529086))
            ThreePointArc((943.890172073, 117.902529086), (945.106463206, 117.398724803), (945.610267489, 116.18243367))
        make_face(mode=Mode.SUBTRACT)
        with Locations((760.070975046, 130.611938178)):
            Circle(SKETCH1_R, mode=Mode.SUBTRACT)
        with Locations((848.138968911, 130.611938178)):
            Circle(SKETCH1_R, mode=Mode.SUBTRACT)
    extrude(amount=BOSS_EXTRUDE1_DEPTH)


solid = part.part
